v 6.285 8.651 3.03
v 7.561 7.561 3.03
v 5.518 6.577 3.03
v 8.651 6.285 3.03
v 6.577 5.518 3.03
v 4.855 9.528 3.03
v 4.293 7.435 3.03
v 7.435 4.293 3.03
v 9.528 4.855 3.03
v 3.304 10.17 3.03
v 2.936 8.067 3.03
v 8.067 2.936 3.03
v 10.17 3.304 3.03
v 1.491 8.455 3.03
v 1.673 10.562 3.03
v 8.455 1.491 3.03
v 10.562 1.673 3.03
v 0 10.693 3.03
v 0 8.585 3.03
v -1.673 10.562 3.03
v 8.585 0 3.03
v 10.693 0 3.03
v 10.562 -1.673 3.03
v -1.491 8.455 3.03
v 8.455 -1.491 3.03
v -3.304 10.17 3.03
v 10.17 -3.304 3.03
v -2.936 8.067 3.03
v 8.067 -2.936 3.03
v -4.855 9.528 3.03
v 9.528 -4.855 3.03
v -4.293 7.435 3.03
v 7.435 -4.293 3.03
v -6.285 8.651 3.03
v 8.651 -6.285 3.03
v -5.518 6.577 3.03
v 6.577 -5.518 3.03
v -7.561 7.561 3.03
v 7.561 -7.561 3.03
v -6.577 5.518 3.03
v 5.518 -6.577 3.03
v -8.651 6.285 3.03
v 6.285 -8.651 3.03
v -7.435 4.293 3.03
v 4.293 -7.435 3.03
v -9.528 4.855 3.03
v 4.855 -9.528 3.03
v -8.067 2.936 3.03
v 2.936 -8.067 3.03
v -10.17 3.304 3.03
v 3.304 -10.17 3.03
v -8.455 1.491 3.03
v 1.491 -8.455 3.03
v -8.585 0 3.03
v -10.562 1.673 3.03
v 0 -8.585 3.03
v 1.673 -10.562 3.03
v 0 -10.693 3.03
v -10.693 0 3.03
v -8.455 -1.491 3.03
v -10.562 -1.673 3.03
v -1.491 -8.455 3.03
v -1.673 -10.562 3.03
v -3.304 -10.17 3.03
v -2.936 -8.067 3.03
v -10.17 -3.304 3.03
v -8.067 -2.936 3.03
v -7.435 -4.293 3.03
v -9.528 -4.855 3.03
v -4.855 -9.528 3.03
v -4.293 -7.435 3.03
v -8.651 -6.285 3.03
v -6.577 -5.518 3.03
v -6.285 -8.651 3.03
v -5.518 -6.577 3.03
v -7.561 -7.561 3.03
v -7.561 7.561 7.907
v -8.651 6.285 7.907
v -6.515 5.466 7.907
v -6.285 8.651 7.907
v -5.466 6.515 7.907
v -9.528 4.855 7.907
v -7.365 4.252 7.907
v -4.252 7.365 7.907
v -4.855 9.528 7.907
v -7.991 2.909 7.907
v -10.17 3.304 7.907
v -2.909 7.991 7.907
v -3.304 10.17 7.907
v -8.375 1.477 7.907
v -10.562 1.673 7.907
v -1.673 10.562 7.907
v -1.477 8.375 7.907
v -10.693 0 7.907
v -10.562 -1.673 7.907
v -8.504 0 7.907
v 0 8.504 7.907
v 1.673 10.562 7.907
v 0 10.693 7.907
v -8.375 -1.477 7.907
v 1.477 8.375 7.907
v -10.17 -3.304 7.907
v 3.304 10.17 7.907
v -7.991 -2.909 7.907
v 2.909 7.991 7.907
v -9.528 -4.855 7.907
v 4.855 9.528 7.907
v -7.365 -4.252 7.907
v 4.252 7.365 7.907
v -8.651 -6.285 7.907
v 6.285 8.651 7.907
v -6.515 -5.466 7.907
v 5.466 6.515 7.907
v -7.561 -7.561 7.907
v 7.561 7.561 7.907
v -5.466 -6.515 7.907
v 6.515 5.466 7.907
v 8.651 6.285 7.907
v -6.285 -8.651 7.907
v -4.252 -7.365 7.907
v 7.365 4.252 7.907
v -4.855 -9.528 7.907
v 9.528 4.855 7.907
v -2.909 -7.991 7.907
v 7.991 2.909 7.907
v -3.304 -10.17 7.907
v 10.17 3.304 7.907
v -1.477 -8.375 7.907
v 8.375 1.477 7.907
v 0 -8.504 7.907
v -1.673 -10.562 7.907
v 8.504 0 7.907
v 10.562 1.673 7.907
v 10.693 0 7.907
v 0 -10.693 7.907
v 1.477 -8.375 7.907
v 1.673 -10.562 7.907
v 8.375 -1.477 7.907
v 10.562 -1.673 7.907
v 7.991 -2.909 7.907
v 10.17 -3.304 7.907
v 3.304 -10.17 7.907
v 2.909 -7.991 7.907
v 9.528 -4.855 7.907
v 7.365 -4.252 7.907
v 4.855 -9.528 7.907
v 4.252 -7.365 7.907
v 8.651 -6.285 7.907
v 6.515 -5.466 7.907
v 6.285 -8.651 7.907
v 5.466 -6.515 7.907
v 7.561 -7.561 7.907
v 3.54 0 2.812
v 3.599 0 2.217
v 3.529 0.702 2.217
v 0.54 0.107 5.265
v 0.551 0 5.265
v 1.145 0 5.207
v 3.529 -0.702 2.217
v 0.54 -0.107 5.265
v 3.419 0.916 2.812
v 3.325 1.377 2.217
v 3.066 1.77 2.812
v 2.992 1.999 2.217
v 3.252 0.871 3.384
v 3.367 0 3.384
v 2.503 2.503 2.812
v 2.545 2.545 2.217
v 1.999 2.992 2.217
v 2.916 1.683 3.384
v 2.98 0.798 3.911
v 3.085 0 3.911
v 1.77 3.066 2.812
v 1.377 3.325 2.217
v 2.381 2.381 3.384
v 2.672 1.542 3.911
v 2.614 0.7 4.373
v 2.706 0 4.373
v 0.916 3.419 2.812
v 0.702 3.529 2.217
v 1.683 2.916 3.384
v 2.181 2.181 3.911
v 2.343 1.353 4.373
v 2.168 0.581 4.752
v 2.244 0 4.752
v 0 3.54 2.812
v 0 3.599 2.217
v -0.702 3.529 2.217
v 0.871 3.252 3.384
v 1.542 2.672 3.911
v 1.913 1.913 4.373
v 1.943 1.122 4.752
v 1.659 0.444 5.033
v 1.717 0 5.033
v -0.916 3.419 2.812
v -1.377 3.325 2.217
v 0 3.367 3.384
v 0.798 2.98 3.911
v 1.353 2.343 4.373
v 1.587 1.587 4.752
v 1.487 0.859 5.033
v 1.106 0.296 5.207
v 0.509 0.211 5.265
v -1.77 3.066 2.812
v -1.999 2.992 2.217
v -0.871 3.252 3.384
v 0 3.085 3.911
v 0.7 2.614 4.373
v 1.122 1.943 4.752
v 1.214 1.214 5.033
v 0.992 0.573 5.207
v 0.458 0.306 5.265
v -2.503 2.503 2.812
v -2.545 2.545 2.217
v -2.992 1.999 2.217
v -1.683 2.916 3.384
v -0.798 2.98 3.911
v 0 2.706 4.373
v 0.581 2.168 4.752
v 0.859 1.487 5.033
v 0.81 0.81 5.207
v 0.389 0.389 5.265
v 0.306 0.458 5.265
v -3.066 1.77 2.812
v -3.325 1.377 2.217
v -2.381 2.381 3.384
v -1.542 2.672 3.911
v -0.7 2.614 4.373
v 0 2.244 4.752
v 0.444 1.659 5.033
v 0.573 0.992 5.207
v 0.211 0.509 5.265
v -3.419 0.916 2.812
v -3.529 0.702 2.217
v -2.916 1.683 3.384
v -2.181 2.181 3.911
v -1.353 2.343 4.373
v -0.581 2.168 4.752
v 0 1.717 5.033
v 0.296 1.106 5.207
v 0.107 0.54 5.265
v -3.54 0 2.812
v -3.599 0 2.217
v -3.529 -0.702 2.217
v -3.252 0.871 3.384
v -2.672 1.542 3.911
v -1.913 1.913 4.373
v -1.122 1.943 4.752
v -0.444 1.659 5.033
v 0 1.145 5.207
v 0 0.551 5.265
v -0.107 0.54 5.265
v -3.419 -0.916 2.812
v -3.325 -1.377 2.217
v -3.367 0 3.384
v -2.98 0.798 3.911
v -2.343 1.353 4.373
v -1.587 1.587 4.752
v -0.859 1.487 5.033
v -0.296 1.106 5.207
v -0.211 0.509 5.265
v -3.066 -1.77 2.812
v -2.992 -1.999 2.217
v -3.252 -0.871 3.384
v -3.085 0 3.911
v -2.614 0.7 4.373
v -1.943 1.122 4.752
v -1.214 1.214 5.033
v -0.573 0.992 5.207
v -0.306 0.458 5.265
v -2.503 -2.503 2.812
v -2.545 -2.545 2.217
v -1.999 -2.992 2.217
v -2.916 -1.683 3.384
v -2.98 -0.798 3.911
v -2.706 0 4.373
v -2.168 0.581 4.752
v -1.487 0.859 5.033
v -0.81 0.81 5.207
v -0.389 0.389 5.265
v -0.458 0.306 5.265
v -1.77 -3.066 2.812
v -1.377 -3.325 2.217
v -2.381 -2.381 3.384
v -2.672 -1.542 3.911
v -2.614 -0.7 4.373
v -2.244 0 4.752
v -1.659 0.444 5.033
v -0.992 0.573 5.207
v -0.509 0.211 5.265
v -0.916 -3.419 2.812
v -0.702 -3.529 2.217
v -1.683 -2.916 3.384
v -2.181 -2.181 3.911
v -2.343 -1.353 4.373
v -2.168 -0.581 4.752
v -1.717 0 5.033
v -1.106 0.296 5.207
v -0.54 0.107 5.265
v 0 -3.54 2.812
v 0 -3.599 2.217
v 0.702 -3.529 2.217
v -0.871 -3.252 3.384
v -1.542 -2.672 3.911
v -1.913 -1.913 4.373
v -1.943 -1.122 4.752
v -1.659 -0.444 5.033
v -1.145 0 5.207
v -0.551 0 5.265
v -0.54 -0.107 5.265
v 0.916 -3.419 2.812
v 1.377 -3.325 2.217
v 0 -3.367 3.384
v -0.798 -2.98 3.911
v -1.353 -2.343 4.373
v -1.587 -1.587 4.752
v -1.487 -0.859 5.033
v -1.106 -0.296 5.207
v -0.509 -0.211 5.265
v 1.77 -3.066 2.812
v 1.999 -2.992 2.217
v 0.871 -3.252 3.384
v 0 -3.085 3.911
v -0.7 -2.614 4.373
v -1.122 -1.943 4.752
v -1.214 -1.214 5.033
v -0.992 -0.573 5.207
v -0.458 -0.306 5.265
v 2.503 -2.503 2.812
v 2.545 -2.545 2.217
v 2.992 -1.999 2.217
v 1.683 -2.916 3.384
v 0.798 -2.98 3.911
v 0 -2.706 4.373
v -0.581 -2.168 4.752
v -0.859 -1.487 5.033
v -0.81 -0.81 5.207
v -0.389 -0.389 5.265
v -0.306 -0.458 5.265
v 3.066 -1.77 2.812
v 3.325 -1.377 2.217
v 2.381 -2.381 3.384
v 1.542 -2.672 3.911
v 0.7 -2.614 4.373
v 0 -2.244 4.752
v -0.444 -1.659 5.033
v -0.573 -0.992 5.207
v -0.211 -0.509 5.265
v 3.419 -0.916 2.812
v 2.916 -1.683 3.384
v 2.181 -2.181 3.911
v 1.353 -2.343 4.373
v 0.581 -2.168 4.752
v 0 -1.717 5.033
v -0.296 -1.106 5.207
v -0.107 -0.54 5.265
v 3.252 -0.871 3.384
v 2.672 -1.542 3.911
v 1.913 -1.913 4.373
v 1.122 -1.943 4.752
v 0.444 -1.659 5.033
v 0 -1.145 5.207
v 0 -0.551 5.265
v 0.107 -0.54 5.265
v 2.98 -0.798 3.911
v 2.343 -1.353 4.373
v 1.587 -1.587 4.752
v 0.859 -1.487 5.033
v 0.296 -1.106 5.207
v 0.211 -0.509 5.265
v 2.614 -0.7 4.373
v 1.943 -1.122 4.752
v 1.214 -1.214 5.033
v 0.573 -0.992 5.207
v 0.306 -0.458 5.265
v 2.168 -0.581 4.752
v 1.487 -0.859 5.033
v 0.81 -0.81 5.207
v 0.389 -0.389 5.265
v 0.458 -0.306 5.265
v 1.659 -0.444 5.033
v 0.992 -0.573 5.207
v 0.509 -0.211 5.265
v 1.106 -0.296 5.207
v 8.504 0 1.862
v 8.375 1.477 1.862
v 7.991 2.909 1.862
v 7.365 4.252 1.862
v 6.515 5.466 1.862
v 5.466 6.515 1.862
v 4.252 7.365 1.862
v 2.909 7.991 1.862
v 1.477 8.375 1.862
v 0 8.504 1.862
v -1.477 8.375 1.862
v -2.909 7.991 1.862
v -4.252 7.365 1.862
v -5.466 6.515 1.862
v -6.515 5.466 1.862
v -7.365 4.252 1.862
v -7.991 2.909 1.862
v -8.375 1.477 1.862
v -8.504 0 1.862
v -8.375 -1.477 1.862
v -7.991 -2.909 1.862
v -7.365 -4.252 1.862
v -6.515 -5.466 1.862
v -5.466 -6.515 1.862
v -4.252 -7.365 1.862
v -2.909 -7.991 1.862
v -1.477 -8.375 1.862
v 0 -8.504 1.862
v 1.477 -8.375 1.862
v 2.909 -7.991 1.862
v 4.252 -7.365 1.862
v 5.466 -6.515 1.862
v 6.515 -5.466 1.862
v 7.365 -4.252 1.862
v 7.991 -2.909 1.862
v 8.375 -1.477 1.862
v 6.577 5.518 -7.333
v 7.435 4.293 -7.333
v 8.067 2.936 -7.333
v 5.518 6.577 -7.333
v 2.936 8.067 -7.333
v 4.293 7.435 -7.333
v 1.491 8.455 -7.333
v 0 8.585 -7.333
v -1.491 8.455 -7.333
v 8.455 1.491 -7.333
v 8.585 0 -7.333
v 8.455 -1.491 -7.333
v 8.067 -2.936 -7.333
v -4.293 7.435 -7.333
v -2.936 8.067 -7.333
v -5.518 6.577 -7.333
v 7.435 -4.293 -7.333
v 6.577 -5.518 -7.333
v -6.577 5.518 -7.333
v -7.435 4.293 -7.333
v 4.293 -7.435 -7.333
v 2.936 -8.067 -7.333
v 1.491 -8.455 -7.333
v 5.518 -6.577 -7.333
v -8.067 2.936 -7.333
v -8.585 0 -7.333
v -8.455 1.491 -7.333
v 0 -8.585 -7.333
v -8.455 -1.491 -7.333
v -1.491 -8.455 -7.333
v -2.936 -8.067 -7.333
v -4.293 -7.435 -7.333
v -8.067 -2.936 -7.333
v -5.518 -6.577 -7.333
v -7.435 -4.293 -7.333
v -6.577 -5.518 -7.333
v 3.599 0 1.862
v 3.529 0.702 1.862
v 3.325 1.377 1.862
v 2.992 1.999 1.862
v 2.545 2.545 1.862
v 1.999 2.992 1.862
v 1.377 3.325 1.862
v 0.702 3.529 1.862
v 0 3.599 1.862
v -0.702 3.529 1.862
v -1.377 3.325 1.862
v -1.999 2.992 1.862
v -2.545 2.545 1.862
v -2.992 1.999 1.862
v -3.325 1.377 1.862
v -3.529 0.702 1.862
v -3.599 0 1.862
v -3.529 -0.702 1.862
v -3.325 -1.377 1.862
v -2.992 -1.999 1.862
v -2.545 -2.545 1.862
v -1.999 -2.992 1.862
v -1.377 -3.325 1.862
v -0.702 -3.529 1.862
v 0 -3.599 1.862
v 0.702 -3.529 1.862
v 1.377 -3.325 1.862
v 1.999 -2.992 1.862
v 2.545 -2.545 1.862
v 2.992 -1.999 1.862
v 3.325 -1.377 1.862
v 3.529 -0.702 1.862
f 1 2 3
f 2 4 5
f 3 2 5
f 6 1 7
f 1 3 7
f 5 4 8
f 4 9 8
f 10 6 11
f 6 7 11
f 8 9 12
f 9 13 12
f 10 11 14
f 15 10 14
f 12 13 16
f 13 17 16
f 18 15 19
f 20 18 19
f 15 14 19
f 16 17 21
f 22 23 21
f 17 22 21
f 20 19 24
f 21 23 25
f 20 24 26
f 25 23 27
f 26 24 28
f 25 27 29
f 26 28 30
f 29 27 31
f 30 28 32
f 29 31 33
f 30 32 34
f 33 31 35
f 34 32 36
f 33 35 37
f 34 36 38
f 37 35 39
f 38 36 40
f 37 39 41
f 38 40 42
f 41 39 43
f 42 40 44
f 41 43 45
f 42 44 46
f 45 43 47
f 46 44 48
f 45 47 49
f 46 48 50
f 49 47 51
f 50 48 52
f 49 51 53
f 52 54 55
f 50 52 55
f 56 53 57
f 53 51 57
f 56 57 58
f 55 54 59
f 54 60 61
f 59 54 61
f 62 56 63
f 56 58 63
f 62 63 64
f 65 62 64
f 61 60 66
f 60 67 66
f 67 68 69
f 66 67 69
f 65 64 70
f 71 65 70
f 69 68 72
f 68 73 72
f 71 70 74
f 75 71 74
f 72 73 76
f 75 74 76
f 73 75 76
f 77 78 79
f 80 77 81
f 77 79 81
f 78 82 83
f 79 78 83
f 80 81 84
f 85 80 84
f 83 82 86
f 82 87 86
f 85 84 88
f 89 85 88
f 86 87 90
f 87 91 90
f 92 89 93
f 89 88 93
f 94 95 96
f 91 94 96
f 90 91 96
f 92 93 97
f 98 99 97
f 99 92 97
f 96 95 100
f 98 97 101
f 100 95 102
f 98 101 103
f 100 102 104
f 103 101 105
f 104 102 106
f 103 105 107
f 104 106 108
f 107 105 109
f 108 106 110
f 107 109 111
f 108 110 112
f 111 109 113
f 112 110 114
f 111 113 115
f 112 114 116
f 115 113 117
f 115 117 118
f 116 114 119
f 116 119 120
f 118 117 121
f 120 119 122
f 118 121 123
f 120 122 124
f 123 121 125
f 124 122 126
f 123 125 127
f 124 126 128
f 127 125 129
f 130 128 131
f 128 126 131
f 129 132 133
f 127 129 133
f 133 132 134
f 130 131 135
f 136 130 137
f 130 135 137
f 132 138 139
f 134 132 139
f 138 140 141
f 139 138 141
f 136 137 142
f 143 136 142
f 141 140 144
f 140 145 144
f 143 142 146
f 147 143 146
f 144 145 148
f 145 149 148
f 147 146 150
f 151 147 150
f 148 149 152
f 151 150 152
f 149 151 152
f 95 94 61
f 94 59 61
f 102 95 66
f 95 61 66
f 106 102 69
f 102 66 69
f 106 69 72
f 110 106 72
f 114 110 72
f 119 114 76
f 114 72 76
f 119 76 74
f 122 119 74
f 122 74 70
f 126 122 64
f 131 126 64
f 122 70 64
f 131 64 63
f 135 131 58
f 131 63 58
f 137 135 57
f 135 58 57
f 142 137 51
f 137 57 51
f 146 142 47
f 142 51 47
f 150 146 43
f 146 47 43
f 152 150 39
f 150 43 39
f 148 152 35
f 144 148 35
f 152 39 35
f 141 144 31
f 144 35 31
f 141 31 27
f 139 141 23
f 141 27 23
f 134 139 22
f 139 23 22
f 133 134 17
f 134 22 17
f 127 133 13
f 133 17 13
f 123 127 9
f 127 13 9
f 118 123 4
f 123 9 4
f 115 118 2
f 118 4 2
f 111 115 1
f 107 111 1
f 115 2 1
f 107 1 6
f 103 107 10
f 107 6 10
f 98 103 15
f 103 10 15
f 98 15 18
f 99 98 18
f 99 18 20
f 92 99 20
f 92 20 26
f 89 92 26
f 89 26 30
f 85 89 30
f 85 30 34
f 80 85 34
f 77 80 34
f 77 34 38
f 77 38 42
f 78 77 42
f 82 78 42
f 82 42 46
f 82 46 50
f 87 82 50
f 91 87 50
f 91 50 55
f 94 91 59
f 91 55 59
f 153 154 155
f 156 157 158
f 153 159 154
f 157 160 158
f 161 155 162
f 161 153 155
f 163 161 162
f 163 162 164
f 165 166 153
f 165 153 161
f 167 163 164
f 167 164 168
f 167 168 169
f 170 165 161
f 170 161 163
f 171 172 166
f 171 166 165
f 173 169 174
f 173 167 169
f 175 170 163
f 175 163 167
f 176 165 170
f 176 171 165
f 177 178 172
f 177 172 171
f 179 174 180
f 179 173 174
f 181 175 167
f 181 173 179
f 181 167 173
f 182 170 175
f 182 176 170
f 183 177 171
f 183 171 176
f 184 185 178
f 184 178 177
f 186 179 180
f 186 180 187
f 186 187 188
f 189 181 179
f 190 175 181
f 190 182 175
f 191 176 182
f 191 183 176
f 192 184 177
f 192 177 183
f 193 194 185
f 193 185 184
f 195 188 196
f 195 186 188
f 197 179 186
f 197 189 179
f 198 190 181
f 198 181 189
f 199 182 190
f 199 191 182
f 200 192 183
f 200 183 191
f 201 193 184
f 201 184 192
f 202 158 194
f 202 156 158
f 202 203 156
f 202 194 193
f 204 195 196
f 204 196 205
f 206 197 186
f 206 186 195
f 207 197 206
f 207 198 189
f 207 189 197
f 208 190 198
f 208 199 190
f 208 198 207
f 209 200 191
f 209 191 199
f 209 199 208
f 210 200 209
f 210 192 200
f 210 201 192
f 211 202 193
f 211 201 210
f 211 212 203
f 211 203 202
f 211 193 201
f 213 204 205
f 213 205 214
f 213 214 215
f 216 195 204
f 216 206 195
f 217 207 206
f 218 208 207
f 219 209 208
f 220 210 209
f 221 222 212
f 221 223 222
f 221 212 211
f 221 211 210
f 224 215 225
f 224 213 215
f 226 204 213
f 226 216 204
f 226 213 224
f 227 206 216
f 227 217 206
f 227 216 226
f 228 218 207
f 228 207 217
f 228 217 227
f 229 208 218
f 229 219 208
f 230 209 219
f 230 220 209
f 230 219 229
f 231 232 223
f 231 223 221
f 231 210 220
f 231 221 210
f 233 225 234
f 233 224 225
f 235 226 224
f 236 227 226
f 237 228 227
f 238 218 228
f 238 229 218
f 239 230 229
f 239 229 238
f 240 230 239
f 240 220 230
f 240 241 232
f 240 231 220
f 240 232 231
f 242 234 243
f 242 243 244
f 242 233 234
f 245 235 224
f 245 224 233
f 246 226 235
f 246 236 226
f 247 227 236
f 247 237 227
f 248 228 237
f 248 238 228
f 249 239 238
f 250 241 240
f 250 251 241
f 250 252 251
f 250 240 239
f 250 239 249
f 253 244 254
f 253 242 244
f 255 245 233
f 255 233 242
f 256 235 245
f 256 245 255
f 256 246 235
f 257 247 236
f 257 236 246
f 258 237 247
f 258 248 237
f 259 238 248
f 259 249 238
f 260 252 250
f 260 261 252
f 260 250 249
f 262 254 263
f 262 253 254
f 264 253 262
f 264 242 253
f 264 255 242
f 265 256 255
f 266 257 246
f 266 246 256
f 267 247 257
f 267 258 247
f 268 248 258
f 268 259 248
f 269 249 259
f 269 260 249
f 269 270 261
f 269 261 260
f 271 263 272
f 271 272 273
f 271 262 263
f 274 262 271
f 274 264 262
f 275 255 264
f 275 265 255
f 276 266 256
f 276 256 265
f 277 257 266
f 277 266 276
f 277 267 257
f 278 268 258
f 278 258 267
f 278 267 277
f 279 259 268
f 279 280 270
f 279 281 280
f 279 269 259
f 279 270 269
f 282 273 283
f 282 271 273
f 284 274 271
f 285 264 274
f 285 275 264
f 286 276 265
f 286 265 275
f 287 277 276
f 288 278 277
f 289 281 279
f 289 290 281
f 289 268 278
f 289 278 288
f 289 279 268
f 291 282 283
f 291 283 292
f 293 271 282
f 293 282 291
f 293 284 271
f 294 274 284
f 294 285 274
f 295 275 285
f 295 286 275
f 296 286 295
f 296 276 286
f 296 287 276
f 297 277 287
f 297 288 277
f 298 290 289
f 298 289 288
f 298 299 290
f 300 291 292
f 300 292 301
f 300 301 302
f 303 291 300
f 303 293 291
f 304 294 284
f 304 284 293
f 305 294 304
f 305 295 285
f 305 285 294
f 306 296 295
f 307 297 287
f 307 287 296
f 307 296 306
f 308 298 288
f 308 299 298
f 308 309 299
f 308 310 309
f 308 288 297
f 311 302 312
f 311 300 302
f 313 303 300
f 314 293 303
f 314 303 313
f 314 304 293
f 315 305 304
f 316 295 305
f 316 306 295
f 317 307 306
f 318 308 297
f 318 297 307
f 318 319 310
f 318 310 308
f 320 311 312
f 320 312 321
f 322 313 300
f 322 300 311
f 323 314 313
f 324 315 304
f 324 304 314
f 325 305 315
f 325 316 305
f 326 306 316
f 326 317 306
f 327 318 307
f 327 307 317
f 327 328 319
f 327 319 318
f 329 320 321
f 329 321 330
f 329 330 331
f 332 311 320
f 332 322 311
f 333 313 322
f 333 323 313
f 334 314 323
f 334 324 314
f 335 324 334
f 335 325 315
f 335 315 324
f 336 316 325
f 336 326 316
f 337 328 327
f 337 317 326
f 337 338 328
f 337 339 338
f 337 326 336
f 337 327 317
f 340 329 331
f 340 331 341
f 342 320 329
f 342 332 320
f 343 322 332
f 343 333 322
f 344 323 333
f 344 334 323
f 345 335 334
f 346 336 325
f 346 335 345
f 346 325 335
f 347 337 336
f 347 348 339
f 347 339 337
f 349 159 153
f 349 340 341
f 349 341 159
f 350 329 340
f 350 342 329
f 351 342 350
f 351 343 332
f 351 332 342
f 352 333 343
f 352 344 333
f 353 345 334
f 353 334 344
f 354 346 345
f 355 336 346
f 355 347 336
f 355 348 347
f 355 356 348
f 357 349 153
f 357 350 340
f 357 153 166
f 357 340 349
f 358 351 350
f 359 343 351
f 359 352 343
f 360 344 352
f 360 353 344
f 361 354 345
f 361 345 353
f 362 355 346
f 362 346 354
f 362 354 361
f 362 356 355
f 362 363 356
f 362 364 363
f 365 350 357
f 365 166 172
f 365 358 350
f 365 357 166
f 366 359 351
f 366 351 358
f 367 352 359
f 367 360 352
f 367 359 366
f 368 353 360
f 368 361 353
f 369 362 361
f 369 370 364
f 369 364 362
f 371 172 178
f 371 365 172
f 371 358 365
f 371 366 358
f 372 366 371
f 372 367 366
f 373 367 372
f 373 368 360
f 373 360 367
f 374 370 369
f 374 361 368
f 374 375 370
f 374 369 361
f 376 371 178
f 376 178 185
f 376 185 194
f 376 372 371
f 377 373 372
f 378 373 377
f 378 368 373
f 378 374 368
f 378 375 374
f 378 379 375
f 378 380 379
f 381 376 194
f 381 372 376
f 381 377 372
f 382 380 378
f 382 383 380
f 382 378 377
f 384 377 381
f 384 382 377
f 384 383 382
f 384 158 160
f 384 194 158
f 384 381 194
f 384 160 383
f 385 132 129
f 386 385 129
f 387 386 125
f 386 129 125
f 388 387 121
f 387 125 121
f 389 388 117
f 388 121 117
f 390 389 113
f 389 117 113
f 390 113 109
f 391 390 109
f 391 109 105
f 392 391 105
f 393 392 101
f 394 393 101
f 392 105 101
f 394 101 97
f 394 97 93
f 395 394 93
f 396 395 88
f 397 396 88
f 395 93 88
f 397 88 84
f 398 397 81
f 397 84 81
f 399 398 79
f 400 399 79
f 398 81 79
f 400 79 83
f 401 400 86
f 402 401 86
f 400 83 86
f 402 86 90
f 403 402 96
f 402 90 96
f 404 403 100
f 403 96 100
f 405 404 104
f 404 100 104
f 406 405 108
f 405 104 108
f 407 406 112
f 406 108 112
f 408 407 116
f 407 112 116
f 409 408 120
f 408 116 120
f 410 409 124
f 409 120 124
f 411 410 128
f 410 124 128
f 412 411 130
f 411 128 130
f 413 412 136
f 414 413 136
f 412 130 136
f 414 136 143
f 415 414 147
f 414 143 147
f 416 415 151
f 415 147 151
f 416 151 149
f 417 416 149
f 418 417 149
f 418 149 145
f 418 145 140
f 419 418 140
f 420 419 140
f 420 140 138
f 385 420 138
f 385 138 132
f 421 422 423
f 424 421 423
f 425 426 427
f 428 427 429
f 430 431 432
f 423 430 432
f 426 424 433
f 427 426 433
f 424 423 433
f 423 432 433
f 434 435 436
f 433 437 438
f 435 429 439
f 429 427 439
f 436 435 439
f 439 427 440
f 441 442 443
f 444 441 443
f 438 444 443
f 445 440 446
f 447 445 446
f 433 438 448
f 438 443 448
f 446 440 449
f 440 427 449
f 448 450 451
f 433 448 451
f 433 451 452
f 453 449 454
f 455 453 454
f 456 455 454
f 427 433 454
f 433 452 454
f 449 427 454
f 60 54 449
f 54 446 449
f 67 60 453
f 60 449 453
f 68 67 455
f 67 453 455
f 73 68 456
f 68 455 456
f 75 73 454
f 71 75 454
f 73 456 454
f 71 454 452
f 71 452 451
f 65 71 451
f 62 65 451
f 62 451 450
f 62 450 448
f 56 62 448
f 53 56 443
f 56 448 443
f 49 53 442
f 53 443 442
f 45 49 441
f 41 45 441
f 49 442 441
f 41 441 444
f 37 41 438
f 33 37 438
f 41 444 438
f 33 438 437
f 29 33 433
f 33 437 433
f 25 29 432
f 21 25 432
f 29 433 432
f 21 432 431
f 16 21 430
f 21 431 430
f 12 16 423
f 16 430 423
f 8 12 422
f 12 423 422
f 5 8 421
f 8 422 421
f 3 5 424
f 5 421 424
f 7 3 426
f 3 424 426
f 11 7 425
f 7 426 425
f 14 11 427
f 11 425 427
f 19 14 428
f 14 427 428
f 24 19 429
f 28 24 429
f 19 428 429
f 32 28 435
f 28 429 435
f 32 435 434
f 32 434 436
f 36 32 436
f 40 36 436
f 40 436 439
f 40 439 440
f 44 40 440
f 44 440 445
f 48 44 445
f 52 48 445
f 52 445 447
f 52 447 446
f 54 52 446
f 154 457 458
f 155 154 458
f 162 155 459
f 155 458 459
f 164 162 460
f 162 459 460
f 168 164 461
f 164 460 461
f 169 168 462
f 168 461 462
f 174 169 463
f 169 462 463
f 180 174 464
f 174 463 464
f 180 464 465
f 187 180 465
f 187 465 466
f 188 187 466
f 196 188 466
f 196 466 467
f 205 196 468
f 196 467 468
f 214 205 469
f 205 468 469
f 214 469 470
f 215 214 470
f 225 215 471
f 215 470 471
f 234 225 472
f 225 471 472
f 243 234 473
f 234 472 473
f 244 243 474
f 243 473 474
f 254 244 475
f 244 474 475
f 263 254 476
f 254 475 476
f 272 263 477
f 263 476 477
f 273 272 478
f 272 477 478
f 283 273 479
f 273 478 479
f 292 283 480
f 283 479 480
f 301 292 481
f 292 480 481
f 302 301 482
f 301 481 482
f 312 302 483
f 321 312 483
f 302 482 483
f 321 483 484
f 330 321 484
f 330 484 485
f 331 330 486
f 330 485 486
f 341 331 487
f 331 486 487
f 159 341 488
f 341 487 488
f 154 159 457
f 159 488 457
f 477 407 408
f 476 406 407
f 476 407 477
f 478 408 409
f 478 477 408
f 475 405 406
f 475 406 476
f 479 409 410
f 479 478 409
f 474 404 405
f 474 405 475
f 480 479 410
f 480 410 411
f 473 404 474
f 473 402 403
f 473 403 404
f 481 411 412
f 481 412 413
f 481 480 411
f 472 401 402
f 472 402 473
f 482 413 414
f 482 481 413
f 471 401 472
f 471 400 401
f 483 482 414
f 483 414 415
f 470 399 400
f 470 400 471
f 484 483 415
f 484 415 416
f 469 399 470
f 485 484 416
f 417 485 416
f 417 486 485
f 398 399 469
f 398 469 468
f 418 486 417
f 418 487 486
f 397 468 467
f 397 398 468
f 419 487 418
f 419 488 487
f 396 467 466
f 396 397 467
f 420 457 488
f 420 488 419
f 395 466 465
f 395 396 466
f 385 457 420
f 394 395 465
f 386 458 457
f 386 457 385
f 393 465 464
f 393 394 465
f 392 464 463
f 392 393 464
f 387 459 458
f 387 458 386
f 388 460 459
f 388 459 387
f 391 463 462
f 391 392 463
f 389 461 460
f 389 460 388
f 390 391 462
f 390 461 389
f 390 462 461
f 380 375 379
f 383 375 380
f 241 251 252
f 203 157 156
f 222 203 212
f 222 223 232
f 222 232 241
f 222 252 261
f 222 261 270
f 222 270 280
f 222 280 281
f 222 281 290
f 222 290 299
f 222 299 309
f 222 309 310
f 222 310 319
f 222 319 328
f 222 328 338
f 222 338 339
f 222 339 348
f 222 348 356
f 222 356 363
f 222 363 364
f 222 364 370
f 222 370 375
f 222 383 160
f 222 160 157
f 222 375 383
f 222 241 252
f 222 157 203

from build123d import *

# Parameters (mm, degrees)
F2_R     = 8.5041977155
F3_DEPTH = 6.0452
F4_R     = 3.5986110649
F5_DEPTH = 3.4036
F6_R     = 3.048


# Not quite as in the source:
# - a feature of the source that left no trace in its solid (it failed there, or was rolled back) is left out


with BuildPart() as f1:
    # F0 (on Front) → F1 (revolve)
    with BuildSketch(Plane.XZ):
        Polygon((0, -7.3331215731), (0, 7.9068784269), (-10.6934, 7.9068784269), (-10.6934, 3.0300784269), (-8.5852, 3.0300784269), (-8.5852, -7.3331215731), align=None)
    revolve(axis=Axis((0, 0, 0.2868784269), (0, 0, 1)))

    # F2 (on face) → F3 (cut)
    with BuildSketch(Plane.XY.offset(7.9068784269)):
        Circle(F2_R)
    extrude(amount=-F3_DEPTH, mode=Mode.SUBTRACT)

    # F4 (on face) → F5 (join)
    with BuildSketch(Plane.XY.offset(1.8616784269)):
        Circle(F4_R)
    extrude(amount=F5_DEPTH)

    # F6
    f6_edges = [f1.edges().sort_by_distance(p)[0] for p in [
        (-3.598611, 0, 5.265278),
    ]]
    fillet(f6_edges, radius=F6_R)


solid = f1.part
